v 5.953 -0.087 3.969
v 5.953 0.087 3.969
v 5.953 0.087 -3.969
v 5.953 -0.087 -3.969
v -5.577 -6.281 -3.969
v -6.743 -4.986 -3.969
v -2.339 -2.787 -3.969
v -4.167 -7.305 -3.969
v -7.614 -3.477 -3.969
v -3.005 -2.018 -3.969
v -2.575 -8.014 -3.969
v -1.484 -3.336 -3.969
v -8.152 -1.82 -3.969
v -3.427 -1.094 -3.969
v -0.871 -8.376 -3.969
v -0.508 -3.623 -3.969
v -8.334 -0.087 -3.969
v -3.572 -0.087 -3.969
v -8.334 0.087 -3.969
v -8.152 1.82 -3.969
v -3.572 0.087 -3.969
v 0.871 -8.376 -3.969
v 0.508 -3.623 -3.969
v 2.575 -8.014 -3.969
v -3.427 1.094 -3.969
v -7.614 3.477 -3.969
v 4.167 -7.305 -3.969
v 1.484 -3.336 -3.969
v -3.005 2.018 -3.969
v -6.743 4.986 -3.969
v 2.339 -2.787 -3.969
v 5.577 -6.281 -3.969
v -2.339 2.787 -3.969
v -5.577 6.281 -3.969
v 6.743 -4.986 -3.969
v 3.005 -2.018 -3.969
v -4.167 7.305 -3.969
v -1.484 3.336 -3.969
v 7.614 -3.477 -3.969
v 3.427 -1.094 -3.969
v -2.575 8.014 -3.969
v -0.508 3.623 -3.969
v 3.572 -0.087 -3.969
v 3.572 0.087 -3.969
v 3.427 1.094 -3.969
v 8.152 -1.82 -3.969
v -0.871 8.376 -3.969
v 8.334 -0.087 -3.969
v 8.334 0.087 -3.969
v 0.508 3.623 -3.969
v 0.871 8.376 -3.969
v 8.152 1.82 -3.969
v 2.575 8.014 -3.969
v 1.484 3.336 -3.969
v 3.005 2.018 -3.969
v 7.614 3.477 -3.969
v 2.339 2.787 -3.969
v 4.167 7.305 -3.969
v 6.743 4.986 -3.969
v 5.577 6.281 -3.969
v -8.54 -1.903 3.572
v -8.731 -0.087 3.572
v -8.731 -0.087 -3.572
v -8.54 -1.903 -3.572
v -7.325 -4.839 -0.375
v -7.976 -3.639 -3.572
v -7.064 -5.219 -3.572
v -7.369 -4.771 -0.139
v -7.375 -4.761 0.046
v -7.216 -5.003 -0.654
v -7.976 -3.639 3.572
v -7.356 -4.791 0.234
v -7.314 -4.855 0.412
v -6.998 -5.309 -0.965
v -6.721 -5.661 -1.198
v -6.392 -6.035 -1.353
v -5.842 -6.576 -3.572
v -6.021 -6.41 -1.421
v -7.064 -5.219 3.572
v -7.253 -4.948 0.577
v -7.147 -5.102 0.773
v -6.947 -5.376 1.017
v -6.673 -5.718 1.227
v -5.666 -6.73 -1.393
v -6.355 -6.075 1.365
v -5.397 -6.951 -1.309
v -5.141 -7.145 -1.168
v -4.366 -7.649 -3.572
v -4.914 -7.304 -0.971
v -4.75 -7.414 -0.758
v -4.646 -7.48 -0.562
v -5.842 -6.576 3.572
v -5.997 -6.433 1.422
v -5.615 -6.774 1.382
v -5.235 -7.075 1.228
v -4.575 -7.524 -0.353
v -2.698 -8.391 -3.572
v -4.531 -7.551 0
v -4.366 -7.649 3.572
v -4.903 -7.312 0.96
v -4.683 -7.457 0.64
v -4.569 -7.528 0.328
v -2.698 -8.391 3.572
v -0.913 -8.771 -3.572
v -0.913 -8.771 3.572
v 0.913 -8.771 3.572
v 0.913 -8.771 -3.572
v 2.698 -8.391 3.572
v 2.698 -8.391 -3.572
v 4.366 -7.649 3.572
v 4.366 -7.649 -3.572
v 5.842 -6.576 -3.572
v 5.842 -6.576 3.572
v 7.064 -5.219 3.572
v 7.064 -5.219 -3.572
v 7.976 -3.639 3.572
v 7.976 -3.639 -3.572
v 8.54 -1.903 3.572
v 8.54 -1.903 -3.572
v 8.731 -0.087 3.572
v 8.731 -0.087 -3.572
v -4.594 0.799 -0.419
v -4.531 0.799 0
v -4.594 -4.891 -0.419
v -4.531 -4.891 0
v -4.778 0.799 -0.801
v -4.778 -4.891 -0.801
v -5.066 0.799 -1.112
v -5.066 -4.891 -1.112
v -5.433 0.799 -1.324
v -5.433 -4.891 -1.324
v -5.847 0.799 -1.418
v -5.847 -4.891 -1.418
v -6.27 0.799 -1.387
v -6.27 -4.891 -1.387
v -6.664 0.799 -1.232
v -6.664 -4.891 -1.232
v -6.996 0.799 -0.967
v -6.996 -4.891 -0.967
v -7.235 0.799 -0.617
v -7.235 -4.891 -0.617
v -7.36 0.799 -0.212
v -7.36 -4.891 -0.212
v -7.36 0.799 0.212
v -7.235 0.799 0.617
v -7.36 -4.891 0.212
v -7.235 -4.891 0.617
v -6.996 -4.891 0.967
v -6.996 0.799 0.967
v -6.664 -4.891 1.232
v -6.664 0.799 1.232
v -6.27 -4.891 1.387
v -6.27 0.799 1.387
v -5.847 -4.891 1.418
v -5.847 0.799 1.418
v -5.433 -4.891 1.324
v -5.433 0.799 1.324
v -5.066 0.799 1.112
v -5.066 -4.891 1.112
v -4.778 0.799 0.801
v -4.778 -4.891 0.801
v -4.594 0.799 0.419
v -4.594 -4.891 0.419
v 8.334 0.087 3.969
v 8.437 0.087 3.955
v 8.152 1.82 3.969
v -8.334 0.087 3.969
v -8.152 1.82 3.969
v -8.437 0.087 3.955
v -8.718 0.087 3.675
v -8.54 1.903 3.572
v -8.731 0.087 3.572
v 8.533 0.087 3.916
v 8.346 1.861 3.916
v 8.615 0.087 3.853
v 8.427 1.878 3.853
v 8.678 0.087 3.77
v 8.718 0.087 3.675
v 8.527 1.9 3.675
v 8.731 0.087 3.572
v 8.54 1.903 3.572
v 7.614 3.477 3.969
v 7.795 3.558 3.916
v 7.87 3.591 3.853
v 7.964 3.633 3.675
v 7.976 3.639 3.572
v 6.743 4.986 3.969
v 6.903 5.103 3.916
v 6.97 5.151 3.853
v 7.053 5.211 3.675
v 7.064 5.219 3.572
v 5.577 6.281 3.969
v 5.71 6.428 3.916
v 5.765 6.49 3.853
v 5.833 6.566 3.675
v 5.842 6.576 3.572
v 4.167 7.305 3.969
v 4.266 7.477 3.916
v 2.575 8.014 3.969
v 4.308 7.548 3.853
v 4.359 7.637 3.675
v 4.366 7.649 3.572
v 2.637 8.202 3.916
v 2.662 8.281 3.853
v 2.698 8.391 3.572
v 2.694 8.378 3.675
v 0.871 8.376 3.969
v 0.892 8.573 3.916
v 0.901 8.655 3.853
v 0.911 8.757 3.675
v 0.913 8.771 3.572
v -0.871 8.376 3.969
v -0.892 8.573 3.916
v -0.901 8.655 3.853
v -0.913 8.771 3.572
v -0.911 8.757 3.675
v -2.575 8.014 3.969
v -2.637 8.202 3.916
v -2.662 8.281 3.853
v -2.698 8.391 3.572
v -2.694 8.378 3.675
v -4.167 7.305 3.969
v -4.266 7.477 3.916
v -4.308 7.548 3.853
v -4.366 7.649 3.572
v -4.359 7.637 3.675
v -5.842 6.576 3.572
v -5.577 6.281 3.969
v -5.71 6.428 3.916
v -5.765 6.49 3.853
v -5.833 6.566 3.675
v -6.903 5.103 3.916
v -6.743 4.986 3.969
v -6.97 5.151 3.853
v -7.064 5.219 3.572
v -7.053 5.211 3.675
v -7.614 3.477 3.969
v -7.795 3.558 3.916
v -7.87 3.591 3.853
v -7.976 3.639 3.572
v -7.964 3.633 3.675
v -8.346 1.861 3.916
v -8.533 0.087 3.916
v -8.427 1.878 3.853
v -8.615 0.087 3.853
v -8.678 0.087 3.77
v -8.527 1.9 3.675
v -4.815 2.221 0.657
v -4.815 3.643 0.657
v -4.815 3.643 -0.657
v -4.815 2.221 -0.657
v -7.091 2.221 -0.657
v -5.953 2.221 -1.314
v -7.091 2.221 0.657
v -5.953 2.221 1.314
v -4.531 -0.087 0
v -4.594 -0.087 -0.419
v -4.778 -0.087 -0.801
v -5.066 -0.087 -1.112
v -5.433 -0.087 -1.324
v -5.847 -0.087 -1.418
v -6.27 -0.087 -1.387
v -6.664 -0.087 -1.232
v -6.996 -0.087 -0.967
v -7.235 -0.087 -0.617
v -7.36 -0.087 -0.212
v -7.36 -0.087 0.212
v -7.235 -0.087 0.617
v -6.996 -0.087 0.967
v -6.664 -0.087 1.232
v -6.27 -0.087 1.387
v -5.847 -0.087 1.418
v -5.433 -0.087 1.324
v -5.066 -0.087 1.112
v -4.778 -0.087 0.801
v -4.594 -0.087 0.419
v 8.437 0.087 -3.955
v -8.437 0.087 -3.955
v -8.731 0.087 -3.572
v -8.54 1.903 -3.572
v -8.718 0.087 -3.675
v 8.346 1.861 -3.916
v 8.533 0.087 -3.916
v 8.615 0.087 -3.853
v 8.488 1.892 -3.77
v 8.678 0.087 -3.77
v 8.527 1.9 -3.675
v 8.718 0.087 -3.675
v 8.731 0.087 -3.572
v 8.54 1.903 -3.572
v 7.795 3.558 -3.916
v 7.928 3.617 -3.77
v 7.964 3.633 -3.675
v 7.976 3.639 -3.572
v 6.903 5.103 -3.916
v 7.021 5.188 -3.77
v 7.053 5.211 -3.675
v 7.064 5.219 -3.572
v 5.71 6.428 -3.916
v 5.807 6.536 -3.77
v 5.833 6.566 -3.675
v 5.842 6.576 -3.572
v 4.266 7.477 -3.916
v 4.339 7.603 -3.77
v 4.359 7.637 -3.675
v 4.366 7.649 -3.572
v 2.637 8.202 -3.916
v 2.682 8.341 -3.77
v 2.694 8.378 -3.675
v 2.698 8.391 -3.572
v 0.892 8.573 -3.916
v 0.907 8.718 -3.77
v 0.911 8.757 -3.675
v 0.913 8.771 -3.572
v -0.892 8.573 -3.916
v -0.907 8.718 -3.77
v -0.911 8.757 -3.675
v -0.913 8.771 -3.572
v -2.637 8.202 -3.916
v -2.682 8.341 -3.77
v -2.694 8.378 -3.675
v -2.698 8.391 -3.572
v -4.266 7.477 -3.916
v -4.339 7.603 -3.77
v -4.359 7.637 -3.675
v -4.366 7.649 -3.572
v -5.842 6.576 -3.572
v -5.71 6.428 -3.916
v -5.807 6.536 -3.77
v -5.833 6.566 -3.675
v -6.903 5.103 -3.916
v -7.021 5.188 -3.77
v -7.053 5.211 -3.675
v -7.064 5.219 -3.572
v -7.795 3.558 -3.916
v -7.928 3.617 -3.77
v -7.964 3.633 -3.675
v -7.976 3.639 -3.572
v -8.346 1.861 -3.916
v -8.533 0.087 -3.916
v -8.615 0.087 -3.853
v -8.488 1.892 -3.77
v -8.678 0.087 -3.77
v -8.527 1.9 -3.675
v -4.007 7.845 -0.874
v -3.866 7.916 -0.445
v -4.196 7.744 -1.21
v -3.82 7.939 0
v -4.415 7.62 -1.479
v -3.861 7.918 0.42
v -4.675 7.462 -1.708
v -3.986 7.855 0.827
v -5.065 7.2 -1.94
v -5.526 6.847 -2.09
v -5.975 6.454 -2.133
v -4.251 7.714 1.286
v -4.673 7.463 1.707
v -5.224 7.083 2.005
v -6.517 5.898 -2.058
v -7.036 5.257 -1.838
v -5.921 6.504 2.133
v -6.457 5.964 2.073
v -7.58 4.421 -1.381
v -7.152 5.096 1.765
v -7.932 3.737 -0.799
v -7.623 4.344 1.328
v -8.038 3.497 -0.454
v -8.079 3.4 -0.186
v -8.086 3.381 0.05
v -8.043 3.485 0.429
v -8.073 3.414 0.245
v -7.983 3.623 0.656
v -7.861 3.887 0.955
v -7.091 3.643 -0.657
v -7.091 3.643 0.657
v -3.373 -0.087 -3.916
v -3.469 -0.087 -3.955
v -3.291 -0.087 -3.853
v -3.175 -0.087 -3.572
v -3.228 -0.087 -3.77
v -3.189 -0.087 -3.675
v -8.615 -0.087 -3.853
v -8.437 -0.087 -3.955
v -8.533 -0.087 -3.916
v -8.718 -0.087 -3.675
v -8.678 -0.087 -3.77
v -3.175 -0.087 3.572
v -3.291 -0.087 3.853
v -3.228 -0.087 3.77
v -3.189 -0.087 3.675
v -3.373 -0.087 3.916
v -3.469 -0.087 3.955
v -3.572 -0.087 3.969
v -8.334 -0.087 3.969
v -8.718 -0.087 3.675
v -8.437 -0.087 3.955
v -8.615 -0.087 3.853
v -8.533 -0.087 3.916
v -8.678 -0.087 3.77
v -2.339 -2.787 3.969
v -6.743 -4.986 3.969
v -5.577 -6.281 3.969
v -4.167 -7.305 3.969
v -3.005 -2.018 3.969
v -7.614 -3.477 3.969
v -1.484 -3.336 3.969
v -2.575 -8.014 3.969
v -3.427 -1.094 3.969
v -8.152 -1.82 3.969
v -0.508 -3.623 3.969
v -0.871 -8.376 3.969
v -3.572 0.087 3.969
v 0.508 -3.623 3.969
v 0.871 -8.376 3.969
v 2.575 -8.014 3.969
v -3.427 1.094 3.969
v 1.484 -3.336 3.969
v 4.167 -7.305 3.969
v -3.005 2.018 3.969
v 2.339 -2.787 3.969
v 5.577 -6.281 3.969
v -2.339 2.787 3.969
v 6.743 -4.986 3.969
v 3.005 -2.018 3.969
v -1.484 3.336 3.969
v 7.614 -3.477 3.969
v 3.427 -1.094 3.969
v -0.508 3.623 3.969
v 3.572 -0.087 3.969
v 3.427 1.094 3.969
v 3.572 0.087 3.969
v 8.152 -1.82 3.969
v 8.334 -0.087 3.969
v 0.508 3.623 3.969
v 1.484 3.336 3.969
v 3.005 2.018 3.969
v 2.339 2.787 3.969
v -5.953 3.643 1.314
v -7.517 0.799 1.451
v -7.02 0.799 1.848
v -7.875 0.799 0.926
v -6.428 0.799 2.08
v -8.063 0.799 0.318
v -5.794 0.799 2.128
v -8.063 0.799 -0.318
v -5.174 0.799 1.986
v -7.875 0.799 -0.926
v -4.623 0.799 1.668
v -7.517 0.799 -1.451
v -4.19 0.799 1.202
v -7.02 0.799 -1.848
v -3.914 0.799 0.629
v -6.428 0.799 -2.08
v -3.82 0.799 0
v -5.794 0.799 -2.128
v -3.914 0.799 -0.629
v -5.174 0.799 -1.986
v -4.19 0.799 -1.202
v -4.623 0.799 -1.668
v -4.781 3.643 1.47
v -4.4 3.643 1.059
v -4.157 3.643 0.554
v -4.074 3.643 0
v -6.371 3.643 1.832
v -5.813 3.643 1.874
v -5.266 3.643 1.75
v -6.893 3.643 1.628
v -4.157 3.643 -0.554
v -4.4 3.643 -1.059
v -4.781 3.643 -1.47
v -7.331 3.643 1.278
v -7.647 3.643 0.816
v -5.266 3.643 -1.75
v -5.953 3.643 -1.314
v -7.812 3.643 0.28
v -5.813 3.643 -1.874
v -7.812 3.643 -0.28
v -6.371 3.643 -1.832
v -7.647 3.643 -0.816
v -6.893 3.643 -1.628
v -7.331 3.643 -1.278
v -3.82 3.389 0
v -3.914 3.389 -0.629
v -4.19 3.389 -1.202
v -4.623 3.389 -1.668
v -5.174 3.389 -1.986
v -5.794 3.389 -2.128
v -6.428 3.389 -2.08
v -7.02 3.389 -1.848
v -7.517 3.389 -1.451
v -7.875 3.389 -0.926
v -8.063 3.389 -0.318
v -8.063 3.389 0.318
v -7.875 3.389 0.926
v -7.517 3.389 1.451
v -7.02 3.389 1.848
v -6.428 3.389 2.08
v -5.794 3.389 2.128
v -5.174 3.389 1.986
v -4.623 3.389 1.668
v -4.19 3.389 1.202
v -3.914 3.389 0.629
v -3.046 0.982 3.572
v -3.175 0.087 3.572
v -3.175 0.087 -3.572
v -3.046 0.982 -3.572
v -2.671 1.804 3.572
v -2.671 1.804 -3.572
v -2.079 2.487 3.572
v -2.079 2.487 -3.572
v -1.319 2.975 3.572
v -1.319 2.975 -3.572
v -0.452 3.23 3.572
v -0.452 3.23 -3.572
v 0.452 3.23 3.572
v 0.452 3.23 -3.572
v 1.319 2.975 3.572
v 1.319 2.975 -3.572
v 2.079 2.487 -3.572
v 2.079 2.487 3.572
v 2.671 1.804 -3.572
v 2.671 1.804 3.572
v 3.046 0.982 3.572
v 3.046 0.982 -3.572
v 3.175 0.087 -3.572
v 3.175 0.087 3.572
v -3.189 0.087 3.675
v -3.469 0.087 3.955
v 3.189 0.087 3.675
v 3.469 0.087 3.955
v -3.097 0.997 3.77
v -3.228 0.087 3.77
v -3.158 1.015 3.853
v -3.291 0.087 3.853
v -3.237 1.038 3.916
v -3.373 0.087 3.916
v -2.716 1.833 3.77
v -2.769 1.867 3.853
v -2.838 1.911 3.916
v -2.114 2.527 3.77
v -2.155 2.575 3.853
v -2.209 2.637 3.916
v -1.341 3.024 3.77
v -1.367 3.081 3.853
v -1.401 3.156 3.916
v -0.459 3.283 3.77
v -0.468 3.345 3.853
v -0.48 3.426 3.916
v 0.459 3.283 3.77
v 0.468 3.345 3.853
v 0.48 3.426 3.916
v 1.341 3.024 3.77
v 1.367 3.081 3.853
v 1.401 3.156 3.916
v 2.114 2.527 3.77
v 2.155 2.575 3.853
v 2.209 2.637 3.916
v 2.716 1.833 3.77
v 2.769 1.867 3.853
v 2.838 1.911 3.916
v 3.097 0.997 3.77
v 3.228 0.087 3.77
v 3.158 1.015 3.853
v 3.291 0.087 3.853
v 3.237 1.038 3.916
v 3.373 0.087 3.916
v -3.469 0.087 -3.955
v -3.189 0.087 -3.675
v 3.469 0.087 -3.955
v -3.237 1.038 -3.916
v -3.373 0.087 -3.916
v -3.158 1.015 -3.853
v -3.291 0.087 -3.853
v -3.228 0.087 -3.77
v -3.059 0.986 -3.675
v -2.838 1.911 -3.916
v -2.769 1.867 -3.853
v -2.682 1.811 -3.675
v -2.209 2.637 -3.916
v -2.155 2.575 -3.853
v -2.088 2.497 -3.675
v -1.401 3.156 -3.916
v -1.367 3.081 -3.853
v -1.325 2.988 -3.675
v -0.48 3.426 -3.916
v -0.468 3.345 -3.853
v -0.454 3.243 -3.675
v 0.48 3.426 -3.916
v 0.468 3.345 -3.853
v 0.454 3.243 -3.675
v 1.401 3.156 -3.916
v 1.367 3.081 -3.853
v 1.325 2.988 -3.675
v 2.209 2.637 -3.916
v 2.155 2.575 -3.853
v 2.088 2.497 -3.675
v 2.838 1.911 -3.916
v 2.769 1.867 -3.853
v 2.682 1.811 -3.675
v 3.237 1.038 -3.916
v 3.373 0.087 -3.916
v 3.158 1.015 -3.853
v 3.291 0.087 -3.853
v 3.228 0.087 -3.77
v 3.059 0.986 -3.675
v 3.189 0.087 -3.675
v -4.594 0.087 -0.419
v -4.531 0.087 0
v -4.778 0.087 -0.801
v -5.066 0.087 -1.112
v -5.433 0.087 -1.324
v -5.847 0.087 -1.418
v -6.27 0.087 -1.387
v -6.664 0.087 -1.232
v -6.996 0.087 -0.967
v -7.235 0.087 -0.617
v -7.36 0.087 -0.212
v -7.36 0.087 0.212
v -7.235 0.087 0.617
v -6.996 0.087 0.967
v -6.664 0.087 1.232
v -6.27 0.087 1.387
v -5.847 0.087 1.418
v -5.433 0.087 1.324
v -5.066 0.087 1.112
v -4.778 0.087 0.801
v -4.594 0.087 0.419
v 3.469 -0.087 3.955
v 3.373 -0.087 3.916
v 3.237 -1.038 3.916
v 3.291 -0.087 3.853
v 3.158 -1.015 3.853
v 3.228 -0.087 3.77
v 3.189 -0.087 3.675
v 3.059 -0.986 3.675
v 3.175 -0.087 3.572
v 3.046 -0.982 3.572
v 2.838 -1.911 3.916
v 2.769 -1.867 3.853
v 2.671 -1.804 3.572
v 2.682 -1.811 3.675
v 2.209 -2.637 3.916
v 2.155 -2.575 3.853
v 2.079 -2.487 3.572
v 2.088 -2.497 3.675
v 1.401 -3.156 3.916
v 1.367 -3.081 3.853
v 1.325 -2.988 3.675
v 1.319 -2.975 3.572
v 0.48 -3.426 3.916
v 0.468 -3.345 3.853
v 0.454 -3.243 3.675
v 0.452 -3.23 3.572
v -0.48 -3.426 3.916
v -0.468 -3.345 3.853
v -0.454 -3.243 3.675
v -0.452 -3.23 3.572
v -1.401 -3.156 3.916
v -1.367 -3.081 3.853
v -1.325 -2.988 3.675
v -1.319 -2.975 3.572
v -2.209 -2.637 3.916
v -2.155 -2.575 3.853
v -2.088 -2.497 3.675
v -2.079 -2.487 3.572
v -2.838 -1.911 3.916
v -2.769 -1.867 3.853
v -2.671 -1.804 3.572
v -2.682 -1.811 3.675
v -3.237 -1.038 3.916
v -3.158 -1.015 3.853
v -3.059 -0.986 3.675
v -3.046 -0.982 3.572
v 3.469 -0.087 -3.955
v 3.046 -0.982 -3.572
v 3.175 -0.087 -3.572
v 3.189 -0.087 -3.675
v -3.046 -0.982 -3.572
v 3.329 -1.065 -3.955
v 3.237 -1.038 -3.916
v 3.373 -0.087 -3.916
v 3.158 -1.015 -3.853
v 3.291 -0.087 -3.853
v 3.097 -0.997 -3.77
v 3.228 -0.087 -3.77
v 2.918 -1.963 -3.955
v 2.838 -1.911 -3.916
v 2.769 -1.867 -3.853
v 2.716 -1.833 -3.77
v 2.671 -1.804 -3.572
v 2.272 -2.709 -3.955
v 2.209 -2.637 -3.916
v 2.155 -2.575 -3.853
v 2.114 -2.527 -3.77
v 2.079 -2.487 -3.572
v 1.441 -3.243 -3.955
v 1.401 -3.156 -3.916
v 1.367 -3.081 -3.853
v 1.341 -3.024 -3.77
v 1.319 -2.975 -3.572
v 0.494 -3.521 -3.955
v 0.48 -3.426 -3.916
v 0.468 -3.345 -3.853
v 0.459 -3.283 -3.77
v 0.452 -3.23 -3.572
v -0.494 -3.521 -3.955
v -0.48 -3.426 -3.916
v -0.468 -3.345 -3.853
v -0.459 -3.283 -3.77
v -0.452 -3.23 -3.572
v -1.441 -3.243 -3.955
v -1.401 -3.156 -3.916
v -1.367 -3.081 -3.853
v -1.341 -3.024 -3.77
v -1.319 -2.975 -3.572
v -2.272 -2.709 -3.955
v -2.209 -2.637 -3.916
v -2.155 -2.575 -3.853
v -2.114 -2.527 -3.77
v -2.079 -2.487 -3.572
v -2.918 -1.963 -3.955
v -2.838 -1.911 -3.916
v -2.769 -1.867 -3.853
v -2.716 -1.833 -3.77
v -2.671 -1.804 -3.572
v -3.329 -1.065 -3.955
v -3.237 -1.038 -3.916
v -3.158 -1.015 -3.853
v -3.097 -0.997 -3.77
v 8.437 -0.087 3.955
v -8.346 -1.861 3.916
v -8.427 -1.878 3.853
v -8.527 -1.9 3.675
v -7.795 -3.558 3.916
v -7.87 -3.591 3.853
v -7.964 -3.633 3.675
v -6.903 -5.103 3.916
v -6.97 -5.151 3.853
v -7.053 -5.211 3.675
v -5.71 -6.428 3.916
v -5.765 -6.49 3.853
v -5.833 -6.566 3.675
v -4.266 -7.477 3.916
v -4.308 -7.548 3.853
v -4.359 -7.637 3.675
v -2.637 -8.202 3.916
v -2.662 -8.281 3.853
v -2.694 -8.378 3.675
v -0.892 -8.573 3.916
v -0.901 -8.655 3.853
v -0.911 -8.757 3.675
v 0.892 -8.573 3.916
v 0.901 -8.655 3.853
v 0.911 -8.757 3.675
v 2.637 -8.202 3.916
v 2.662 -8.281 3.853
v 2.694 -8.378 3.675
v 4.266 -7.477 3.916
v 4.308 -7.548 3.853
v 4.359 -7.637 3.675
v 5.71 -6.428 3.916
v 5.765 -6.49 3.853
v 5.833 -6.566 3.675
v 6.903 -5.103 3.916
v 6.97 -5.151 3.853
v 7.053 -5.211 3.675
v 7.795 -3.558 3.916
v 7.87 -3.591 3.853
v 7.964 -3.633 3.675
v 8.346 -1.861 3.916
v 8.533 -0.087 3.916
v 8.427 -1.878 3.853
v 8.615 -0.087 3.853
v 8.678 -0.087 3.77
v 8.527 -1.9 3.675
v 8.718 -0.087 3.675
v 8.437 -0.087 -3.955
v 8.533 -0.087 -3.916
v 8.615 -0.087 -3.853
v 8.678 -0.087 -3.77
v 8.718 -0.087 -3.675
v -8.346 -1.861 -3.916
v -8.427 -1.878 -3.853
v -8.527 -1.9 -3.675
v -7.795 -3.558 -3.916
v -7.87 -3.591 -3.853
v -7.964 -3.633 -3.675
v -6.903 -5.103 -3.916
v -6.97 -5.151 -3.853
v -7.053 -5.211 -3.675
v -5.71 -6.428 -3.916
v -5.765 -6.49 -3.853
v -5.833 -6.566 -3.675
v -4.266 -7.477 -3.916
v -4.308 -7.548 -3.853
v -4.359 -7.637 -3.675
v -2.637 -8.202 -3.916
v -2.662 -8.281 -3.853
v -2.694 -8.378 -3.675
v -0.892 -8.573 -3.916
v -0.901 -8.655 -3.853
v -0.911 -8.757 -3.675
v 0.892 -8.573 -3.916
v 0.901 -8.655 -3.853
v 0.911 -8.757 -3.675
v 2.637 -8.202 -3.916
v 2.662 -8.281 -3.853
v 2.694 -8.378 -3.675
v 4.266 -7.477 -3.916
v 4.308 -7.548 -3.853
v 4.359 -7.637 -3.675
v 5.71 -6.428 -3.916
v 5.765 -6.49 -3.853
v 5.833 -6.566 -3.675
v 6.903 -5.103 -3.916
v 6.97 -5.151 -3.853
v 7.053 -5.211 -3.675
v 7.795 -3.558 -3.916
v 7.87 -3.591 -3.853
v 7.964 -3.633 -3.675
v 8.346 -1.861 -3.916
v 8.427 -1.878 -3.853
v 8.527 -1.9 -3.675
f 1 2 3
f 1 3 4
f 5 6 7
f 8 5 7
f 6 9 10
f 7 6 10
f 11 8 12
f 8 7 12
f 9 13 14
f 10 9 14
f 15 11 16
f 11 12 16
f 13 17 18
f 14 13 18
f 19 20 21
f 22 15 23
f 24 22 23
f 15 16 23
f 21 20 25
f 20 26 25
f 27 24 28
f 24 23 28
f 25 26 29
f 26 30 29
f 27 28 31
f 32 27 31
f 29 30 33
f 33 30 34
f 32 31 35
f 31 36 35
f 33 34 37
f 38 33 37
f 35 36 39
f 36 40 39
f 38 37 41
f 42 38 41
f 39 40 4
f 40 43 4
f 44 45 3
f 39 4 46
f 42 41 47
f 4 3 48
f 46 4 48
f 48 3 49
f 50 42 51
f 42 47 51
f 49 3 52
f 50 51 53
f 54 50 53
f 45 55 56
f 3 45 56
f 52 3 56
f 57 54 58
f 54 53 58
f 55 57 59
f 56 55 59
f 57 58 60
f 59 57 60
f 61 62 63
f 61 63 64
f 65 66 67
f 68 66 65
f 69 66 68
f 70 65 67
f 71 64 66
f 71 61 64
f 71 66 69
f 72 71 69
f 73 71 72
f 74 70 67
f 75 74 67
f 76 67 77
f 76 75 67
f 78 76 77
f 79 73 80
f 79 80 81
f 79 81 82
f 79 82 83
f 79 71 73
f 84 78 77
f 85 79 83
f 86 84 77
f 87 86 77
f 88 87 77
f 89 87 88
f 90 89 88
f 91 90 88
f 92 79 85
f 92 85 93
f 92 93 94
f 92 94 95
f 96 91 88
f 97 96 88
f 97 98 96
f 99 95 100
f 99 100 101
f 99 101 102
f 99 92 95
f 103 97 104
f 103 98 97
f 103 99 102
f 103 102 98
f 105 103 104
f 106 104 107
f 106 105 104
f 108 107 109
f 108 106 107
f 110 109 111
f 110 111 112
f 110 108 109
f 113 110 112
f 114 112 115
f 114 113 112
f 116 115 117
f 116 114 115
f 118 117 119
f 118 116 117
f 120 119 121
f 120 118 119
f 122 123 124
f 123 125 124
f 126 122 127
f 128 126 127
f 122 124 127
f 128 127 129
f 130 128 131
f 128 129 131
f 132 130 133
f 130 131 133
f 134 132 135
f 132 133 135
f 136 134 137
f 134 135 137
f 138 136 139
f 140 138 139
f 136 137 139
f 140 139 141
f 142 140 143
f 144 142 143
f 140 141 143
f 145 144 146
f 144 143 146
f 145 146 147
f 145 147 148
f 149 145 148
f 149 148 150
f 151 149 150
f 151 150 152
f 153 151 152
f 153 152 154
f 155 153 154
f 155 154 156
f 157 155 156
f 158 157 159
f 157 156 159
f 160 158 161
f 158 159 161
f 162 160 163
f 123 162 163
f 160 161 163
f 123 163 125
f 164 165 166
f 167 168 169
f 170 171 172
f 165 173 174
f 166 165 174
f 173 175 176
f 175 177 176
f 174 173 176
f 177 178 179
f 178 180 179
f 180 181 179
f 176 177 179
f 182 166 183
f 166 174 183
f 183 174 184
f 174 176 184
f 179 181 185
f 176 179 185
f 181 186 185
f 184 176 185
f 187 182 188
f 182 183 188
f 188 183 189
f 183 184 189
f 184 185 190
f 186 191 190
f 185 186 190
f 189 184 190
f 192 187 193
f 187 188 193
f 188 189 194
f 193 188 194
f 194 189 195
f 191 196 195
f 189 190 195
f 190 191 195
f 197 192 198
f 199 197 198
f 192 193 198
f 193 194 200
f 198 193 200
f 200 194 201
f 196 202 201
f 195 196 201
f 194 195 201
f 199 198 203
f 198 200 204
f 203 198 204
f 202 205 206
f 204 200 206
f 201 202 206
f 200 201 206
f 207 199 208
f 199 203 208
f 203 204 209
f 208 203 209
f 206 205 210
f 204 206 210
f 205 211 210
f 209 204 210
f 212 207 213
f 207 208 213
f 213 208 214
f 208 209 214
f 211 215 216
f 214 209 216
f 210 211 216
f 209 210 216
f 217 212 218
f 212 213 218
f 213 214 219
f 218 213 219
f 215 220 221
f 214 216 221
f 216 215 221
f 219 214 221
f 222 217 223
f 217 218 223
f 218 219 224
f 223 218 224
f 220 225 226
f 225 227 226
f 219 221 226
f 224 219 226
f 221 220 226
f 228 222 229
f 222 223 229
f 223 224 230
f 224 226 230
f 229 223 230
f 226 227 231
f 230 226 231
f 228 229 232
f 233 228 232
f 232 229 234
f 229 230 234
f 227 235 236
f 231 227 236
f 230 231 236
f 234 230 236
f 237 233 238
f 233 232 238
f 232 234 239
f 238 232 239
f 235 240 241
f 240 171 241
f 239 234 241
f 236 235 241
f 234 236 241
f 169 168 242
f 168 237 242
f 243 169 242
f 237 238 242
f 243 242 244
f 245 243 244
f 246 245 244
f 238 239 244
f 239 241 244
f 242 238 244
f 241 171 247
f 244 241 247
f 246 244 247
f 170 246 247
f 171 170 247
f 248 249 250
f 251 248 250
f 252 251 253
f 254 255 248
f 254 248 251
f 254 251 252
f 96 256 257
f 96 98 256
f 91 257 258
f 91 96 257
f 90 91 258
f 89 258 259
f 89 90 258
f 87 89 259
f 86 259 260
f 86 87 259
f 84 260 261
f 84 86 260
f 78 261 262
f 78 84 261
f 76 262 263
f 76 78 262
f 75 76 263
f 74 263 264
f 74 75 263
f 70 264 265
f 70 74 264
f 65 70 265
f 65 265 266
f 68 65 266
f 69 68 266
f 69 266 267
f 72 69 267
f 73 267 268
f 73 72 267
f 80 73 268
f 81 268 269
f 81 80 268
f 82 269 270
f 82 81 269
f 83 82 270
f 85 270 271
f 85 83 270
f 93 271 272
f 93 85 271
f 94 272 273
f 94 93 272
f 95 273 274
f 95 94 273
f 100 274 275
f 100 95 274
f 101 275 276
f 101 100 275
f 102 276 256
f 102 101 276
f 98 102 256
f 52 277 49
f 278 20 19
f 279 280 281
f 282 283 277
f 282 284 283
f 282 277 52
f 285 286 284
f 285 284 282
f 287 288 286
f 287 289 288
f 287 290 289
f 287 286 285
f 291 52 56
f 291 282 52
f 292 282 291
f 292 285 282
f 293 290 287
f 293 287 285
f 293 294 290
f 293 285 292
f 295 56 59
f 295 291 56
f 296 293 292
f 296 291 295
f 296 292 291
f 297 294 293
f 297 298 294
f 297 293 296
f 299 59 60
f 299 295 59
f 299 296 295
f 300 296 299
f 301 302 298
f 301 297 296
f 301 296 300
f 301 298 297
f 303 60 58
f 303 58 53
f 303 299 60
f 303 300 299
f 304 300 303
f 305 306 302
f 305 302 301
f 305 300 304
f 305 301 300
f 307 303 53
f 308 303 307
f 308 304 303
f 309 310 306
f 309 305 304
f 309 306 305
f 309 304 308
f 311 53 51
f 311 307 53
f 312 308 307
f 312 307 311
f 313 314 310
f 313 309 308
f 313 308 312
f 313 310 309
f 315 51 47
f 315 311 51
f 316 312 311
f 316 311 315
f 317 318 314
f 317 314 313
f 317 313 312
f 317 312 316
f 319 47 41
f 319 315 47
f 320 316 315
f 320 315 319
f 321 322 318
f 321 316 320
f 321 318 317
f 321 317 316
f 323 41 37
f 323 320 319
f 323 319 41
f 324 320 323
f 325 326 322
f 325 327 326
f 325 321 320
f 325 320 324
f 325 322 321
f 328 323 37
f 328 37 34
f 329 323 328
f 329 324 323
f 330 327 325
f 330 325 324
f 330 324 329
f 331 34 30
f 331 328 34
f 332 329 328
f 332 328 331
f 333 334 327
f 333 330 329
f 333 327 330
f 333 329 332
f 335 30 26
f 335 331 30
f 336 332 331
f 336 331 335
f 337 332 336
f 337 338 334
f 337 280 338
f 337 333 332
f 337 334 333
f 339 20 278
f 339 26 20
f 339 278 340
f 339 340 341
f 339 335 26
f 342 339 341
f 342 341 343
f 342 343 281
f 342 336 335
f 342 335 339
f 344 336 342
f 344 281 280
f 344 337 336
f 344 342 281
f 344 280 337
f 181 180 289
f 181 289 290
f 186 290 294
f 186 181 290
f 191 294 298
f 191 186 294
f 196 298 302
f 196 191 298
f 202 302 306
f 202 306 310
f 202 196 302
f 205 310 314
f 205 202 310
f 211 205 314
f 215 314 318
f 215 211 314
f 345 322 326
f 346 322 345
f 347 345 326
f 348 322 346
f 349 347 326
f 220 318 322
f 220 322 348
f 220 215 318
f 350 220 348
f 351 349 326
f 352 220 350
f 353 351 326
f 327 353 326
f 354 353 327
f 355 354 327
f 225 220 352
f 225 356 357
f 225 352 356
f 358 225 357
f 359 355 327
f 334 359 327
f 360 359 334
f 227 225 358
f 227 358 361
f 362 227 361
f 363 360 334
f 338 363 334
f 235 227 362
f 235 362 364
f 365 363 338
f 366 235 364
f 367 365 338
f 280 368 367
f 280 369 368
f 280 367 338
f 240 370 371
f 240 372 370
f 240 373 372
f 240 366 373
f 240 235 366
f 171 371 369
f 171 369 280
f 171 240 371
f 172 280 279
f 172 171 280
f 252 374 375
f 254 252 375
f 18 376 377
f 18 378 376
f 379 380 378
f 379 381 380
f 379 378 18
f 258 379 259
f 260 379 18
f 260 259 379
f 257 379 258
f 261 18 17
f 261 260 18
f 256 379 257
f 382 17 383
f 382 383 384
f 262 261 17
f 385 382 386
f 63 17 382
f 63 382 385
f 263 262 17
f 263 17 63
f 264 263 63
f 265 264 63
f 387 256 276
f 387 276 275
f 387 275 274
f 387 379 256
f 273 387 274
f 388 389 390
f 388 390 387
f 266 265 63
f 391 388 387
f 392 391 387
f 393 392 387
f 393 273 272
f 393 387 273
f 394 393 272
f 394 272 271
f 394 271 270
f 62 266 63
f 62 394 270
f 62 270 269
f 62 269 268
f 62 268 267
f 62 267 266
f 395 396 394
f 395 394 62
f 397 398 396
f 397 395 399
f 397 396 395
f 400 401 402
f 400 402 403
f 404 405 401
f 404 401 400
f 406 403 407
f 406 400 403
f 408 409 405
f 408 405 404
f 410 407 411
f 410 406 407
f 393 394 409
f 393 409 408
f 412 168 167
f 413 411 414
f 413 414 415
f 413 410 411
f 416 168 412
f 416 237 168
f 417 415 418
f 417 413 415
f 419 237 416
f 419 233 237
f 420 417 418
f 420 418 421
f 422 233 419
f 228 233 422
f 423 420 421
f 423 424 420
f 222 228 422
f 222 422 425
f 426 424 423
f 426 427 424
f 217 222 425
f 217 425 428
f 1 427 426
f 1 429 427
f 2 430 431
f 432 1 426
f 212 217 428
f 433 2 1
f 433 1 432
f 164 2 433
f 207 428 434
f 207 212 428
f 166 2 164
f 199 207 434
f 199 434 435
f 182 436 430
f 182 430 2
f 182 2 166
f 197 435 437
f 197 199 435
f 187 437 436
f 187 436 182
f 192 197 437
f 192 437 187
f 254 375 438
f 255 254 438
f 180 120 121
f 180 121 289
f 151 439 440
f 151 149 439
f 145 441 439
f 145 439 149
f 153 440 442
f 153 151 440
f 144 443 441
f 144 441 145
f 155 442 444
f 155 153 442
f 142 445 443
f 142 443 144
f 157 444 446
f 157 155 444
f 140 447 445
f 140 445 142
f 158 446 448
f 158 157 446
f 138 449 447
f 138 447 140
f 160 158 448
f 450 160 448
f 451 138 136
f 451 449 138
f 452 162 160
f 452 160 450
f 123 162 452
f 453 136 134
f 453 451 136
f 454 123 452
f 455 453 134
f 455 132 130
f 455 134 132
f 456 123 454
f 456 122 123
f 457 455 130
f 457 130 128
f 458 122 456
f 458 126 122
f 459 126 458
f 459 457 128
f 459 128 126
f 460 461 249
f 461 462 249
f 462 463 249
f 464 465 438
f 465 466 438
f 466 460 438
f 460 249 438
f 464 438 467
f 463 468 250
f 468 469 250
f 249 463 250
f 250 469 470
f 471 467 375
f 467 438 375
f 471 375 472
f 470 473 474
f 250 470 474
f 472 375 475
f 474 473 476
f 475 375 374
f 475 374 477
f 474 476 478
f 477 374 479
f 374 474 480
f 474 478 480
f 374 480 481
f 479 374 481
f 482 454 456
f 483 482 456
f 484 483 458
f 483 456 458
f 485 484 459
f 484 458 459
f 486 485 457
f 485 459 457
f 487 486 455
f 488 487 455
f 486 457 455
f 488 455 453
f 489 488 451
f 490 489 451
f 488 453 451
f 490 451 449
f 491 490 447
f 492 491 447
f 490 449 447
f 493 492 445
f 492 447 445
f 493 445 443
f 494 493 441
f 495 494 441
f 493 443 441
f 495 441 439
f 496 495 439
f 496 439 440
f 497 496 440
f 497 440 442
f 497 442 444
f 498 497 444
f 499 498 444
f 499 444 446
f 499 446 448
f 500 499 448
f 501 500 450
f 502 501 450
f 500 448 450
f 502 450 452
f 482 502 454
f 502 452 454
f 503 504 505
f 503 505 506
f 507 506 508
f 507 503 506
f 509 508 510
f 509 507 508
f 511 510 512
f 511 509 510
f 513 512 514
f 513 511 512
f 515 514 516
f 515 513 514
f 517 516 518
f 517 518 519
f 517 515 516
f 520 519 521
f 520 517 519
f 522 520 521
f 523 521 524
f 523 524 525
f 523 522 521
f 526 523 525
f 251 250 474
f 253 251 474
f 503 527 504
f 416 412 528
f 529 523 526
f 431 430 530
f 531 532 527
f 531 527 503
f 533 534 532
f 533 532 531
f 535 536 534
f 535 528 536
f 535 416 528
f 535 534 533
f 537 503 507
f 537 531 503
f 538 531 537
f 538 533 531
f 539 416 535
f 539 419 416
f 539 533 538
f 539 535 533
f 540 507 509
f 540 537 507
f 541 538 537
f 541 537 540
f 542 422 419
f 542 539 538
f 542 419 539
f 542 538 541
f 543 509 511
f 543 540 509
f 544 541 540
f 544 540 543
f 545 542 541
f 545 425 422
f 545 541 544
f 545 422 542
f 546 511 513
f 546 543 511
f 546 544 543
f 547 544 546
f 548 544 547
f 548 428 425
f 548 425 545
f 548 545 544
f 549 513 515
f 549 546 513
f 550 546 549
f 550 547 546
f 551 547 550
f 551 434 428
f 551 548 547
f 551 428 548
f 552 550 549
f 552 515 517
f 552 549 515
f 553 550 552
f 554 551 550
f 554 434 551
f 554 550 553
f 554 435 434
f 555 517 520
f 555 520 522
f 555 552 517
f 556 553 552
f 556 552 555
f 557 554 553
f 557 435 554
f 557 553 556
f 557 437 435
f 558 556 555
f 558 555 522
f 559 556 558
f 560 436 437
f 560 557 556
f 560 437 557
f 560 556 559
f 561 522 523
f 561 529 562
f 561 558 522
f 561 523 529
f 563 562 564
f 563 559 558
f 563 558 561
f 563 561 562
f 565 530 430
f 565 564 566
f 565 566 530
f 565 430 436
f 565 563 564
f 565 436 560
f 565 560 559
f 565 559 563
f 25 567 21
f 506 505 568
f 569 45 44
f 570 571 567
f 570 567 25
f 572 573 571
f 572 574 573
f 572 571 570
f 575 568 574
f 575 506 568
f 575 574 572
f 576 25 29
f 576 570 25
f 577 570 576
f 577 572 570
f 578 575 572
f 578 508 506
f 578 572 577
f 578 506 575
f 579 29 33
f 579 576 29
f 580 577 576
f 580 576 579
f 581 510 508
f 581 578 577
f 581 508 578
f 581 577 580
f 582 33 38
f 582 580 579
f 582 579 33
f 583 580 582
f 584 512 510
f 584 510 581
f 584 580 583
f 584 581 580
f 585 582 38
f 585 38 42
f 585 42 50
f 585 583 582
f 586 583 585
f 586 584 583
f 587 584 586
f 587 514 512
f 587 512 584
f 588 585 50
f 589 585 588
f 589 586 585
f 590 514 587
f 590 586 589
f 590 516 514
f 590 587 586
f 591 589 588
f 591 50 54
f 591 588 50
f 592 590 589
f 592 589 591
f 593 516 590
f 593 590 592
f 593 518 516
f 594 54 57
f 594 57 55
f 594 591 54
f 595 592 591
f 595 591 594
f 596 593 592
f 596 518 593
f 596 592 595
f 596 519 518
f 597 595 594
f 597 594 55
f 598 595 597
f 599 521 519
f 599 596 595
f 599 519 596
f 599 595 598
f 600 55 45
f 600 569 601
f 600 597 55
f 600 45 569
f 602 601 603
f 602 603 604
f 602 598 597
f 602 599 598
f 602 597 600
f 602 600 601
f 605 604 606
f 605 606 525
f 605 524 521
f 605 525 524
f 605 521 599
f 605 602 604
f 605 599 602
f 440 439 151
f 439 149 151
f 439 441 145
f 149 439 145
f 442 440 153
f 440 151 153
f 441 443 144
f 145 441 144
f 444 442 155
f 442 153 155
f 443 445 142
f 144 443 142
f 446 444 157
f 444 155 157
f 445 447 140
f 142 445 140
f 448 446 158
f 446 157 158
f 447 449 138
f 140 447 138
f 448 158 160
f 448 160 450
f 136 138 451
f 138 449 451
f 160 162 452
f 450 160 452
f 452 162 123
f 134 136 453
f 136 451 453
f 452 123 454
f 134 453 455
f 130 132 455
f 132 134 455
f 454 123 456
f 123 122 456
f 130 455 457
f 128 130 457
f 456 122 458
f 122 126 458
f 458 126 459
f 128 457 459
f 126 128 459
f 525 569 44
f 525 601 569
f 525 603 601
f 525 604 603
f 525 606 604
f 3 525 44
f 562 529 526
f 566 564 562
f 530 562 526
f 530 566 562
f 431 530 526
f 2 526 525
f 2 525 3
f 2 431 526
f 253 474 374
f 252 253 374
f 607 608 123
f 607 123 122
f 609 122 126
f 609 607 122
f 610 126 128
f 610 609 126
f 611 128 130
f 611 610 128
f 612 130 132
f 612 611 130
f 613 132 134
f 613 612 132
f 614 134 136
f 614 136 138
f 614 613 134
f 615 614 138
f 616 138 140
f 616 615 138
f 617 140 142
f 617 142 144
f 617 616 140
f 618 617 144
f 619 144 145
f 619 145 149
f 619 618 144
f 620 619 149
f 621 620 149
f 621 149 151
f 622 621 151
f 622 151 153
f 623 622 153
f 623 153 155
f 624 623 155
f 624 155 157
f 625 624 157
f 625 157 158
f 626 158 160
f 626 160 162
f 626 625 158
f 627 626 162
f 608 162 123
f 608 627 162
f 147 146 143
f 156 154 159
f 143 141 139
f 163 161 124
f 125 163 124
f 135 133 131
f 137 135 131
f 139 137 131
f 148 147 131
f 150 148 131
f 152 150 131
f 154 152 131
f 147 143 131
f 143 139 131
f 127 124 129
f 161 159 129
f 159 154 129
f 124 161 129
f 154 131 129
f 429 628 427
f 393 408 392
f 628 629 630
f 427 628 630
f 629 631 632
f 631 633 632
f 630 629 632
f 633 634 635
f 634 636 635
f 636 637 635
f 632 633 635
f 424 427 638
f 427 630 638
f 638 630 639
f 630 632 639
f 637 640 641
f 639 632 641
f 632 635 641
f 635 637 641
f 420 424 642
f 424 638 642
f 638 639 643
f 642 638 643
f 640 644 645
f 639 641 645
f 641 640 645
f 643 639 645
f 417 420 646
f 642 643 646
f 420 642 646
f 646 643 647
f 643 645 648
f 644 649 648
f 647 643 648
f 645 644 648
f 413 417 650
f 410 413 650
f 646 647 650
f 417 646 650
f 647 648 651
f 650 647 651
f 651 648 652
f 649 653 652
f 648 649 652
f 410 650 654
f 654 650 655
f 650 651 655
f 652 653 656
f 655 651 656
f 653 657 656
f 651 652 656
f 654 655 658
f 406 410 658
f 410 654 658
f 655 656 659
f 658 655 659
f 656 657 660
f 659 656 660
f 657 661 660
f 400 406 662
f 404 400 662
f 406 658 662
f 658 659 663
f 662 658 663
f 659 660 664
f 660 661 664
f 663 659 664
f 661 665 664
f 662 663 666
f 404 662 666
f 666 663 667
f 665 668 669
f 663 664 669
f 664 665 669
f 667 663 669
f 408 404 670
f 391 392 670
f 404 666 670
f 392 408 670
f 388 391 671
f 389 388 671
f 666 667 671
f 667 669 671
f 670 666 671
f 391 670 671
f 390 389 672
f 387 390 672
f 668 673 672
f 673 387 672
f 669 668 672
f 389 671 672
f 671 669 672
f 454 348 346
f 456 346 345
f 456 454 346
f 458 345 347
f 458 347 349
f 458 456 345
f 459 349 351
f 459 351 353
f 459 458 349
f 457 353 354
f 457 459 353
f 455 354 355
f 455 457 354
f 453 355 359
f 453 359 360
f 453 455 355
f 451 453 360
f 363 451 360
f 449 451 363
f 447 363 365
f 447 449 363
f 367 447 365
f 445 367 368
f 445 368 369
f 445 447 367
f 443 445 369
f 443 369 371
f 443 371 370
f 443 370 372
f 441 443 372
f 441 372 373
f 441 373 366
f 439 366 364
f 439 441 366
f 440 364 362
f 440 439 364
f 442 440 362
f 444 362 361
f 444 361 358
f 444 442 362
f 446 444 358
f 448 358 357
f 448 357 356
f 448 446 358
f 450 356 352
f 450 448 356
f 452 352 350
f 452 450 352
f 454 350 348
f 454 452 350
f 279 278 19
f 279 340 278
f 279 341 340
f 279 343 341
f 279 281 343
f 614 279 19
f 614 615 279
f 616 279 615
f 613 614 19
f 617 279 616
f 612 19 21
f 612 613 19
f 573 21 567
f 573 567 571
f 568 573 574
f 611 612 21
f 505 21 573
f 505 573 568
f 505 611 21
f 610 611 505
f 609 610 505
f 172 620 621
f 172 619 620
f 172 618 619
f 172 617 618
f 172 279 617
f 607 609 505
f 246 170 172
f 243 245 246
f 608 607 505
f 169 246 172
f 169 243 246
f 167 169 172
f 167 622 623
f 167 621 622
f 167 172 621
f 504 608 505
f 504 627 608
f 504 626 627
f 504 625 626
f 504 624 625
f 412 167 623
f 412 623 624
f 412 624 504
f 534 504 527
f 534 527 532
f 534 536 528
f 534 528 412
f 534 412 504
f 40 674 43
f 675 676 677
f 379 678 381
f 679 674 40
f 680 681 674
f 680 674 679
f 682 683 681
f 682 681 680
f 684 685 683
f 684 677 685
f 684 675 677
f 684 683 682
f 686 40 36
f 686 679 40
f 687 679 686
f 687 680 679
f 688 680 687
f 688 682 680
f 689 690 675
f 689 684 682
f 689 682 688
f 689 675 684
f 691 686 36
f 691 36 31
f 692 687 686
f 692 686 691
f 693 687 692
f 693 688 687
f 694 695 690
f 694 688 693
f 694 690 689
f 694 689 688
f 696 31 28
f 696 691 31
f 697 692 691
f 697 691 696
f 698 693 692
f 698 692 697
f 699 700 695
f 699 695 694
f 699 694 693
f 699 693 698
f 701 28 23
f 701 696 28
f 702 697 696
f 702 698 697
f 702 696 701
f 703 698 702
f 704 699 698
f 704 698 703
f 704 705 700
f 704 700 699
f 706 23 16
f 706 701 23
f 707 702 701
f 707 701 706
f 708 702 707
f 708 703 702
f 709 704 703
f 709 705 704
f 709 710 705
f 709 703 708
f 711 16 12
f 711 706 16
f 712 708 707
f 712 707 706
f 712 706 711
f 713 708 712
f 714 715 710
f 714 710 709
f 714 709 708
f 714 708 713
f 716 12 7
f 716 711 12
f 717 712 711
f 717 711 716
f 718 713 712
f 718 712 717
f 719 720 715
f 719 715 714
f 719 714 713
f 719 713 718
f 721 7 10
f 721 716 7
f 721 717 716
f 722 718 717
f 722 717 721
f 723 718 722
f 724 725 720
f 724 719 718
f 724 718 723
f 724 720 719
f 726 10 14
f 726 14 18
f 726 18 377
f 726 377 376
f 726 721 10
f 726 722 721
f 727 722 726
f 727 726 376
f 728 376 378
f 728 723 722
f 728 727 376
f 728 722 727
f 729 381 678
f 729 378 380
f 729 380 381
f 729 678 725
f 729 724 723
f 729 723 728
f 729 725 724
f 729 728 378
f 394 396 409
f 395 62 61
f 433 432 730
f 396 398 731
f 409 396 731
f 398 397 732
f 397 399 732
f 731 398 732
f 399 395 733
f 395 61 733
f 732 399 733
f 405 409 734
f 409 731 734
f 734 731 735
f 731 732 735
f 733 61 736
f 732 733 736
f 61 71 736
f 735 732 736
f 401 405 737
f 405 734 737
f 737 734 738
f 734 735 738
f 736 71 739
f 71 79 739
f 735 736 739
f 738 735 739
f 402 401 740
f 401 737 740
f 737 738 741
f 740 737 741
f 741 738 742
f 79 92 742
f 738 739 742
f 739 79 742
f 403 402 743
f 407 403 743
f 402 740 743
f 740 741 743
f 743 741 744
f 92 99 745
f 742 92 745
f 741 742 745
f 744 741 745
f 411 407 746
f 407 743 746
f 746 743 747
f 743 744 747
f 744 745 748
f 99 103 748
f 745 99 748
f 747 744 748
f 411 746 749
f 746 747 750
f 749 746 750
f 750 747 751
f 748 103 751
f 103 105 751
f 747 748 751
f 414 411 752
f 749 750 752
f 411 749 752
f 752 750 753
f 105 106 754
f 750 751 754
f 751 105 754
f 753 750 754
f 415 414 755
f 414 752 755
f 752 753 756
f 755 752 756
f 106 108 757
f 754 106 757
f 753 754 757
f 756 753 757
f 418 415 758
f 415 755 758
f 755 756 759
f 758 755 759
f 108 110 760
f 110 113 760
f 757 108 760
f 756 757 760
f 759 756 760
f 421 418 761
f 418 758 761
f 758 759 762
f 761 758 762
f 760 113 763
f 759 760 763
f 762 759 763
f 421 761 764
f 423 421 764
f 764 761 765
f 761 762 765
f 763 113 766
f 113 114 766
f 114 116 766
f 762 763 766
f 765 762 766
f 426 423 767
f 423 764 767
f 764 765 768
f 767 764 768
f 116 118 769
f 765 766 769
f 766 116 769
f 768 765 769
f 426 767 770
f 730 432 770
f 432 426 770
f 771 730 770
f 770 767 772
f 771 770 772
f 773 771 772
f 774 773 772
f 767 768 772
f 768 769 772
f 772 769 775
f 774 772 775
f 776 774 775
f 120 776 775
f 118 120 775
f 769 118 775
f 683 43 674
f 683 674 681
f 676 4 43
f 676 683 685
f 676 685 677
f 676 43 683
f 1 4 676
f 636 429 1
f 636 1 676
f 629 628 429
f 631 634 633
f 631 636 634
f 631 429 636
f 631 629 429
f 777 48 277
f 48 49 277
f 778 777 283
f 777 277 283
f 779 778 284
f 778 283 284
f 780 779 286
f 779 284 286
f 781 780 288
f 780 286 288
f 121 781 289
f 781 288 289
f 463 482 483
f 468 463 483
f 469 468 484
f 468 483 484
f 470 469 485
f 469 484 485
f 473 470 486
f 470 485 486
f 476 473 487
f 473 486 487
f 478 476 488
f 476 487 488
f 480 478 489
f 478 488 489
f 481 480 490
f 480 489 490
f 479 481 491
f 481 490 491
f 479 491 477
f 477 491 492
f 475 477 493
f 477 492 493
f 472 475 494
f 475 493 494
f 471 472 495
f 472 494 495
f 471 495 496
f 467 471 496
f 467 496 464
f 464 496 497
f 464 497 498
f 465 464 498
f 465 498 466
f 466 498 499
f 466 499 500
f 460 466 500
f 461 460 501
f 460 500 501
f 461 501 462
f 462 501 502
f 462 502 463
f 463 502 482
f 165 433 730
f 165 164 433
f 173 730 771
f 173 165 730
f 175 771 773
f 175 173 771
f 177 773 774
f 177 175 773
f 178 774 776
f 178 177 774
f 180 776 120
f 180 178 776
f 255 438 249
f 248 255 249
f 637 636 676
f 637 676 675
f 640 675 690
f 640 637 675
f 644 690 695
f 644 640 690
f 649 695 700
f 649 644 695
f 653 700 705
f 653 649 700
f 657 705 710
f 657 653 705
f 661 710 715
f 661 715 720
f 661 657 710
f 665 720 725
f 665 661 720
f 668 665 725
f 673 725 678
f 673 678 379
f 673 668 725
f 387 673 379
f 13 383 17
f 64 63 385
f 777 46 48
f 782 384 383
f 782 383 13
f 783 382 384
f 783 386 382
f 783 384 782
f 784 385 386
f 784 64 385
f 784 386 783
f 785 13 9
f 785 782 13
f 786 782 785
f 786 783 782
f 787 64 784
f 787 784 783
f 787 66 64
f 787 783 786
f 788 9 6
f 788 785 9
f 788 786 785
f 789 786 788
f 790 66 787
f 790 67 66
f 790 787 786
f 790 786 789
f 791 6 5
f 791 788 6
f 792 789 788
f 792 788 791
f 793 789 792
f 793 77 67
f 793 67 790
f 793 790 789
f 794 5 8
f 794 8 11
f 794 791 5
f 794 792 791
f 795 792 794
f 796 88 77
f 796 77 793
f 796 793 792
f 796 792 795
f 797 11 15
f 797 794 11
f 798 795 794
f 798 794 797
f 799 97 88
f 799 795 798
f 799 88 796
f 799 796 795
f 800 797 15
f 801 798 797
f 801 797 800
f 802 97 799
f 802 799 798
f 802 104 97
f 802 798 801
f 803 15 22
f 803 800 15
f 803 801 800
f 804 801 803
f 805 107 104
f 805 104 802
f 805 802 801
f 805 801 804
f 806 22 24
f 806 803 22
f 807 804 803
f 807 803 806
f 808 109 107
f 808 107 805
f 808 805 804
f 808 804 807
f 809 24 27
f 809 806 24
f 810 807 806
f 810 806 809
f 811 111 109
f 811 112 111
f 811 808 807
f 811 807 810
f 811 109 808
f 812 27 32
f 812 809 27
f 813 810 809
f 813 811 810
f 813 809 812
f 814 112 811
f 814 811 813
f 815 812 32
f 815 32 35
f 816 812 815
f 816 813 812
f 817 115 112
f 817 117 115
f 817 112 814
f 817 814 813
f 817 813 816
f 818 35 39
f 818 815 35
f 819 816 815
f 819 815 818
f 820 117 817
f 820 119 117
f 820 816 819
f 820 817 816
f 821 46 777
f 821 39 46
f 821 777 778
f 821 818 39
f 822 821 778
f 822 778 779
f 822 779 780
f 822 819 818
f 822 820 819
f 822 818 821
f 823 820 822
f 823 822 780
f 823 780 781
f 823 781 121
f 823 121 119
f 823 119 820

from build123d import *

# Parameters (mm, degrees)
EXTRUDE1_DEPTH     = 3.96875
CUT_EXTRUDE2_DEPTH = 1.4224
FILLET1_R          = 0.396875
FILLET2_R          = 0.396875
CHAMFER2_SIZE      = 0.254


with BuildPart() as part:
    # Sketch1 → Extrude1 (new body, symmetric)
    with BuildSketch(Plane.XY):
        with BuildLine():
            Line((-8.73125, 0.0873125), (-3.175, 0.0873125))
            ThreePointArc((-3.175, 0.0873125), (0, 3.2623125), (3.175, 0.0873125))
            Line((3.175, 0.0873125), (5.953125, 0.0873125))
            Line((5.953125, 0.0873125), (5.953125, -0.0873125))
            Line((5.953125, -0.0873125), (3.175, -0.0873125))
            ThreePointArc((3.175, -0.0873125), (0, -3.2623125), (-3.175, -0.0873125))
            Line((-3.175, -0.0873125), (-8.73125, -0.0873125))
            ThreePointArc((-8.73125, -0.0873125), (0, -8.8185625), (8.73125, -0.0873125))
            Line((8.73125, -0.0873125), (8.73125, 0.0873125))
            ThreePointArc((8.73125, 0.0873125), (0, 8.8185625), (-8.73125, 0.0873125))
        make_face()
    extrude(amount=EXTRUDE1_DEPTH, both=True)

    # Sketch4 → Cut-Revolve1 (revolve, cut)
    with BuildSketch(Plane.XY):
        Polygon((-5.953125, 8.8185625), (-3.819525, 8.8185625), (-3.819525, 0.7985125), (-4.530725, 0.7985125), (-4.530725, -8.8185625), (-5.953125, -8.8185625), align=None)
    revolve(axis=Axis((-5.953125, -8.8185625, 0), (0, 1, 0)), mode=Mode.SUBTRACT)

    # Fillet1
    fillet1_edges = [part.edges().sort_by_distance(p)[0] for p in [
        (0, 3.2623125, 3.96875),
        (0, 3.2623125, -3.96875),
        (0, 8.8185625, -3.96875),
        (0, -8.8185625, 3.96875),
        (8.73125, 0, 3.96875),
        (0, 8.8185625, 3.96875),
        (8.73125, 0, -3.96875),
        (0, -8.8185625, -3.96875),
    ]]
    fillet(fillet1_edges, radius=FILLET1_R)

    # Fillet2
    fillet2_edges = [part.edges().sort_by_distance(p)[0] for p in [
        (0, -3.2623125, 3.96875),
        (0, -3.2623125, -3.96875),
    ]]
    fillet(fillet2_edges, radius=FILLET2_R)


with BuildPart() as body_2:
    # Sketch6 → Revolve1 (revolve)
    with BuildSketch(Plane.XY):
        Polygon((-5.953125, 3.6433125), (-3.819525, 3.6433125), (-3.819525, 0.7985125), (-4.530725, 0.7985125), (-4.530725, -4.8910875), (-5.953125, -4.8910875), align=None)
    revolve(axis=Axis((-5.953125, -4.8910875, 0), (0, 1, 0)))

    # Sketch7 → Cut-Extrude2 (cut)
    with BuildSketch(Plane(origin=(0, 3.6433125, 0), x_dir=(-1, 0, 0), z_dir=(0, 1, 0))):
        Polygon((5.953125, -1.313956837), (7.091045, -0.656978418), (7.091045, 0.656978418), (5.953125, 1.313956837), (4.815205, 0.656978418), (4.815205, -0.656978418), align=None)
    extrude(amount=-CUT_EXTRUDE2_DEPTH, mode=Mode.SUBTRACT)

    # Chamfer2
    chamfer2_edges = [body_2.edges().sort_by_distance(p)[0] for p in [
        (-8.086725, 3.6433125, 0),
    ]]
    chamfer(chamfer2_edges, length=CHAMFER2_SIZE)


solid = Compound([part.part, body_2.part])
